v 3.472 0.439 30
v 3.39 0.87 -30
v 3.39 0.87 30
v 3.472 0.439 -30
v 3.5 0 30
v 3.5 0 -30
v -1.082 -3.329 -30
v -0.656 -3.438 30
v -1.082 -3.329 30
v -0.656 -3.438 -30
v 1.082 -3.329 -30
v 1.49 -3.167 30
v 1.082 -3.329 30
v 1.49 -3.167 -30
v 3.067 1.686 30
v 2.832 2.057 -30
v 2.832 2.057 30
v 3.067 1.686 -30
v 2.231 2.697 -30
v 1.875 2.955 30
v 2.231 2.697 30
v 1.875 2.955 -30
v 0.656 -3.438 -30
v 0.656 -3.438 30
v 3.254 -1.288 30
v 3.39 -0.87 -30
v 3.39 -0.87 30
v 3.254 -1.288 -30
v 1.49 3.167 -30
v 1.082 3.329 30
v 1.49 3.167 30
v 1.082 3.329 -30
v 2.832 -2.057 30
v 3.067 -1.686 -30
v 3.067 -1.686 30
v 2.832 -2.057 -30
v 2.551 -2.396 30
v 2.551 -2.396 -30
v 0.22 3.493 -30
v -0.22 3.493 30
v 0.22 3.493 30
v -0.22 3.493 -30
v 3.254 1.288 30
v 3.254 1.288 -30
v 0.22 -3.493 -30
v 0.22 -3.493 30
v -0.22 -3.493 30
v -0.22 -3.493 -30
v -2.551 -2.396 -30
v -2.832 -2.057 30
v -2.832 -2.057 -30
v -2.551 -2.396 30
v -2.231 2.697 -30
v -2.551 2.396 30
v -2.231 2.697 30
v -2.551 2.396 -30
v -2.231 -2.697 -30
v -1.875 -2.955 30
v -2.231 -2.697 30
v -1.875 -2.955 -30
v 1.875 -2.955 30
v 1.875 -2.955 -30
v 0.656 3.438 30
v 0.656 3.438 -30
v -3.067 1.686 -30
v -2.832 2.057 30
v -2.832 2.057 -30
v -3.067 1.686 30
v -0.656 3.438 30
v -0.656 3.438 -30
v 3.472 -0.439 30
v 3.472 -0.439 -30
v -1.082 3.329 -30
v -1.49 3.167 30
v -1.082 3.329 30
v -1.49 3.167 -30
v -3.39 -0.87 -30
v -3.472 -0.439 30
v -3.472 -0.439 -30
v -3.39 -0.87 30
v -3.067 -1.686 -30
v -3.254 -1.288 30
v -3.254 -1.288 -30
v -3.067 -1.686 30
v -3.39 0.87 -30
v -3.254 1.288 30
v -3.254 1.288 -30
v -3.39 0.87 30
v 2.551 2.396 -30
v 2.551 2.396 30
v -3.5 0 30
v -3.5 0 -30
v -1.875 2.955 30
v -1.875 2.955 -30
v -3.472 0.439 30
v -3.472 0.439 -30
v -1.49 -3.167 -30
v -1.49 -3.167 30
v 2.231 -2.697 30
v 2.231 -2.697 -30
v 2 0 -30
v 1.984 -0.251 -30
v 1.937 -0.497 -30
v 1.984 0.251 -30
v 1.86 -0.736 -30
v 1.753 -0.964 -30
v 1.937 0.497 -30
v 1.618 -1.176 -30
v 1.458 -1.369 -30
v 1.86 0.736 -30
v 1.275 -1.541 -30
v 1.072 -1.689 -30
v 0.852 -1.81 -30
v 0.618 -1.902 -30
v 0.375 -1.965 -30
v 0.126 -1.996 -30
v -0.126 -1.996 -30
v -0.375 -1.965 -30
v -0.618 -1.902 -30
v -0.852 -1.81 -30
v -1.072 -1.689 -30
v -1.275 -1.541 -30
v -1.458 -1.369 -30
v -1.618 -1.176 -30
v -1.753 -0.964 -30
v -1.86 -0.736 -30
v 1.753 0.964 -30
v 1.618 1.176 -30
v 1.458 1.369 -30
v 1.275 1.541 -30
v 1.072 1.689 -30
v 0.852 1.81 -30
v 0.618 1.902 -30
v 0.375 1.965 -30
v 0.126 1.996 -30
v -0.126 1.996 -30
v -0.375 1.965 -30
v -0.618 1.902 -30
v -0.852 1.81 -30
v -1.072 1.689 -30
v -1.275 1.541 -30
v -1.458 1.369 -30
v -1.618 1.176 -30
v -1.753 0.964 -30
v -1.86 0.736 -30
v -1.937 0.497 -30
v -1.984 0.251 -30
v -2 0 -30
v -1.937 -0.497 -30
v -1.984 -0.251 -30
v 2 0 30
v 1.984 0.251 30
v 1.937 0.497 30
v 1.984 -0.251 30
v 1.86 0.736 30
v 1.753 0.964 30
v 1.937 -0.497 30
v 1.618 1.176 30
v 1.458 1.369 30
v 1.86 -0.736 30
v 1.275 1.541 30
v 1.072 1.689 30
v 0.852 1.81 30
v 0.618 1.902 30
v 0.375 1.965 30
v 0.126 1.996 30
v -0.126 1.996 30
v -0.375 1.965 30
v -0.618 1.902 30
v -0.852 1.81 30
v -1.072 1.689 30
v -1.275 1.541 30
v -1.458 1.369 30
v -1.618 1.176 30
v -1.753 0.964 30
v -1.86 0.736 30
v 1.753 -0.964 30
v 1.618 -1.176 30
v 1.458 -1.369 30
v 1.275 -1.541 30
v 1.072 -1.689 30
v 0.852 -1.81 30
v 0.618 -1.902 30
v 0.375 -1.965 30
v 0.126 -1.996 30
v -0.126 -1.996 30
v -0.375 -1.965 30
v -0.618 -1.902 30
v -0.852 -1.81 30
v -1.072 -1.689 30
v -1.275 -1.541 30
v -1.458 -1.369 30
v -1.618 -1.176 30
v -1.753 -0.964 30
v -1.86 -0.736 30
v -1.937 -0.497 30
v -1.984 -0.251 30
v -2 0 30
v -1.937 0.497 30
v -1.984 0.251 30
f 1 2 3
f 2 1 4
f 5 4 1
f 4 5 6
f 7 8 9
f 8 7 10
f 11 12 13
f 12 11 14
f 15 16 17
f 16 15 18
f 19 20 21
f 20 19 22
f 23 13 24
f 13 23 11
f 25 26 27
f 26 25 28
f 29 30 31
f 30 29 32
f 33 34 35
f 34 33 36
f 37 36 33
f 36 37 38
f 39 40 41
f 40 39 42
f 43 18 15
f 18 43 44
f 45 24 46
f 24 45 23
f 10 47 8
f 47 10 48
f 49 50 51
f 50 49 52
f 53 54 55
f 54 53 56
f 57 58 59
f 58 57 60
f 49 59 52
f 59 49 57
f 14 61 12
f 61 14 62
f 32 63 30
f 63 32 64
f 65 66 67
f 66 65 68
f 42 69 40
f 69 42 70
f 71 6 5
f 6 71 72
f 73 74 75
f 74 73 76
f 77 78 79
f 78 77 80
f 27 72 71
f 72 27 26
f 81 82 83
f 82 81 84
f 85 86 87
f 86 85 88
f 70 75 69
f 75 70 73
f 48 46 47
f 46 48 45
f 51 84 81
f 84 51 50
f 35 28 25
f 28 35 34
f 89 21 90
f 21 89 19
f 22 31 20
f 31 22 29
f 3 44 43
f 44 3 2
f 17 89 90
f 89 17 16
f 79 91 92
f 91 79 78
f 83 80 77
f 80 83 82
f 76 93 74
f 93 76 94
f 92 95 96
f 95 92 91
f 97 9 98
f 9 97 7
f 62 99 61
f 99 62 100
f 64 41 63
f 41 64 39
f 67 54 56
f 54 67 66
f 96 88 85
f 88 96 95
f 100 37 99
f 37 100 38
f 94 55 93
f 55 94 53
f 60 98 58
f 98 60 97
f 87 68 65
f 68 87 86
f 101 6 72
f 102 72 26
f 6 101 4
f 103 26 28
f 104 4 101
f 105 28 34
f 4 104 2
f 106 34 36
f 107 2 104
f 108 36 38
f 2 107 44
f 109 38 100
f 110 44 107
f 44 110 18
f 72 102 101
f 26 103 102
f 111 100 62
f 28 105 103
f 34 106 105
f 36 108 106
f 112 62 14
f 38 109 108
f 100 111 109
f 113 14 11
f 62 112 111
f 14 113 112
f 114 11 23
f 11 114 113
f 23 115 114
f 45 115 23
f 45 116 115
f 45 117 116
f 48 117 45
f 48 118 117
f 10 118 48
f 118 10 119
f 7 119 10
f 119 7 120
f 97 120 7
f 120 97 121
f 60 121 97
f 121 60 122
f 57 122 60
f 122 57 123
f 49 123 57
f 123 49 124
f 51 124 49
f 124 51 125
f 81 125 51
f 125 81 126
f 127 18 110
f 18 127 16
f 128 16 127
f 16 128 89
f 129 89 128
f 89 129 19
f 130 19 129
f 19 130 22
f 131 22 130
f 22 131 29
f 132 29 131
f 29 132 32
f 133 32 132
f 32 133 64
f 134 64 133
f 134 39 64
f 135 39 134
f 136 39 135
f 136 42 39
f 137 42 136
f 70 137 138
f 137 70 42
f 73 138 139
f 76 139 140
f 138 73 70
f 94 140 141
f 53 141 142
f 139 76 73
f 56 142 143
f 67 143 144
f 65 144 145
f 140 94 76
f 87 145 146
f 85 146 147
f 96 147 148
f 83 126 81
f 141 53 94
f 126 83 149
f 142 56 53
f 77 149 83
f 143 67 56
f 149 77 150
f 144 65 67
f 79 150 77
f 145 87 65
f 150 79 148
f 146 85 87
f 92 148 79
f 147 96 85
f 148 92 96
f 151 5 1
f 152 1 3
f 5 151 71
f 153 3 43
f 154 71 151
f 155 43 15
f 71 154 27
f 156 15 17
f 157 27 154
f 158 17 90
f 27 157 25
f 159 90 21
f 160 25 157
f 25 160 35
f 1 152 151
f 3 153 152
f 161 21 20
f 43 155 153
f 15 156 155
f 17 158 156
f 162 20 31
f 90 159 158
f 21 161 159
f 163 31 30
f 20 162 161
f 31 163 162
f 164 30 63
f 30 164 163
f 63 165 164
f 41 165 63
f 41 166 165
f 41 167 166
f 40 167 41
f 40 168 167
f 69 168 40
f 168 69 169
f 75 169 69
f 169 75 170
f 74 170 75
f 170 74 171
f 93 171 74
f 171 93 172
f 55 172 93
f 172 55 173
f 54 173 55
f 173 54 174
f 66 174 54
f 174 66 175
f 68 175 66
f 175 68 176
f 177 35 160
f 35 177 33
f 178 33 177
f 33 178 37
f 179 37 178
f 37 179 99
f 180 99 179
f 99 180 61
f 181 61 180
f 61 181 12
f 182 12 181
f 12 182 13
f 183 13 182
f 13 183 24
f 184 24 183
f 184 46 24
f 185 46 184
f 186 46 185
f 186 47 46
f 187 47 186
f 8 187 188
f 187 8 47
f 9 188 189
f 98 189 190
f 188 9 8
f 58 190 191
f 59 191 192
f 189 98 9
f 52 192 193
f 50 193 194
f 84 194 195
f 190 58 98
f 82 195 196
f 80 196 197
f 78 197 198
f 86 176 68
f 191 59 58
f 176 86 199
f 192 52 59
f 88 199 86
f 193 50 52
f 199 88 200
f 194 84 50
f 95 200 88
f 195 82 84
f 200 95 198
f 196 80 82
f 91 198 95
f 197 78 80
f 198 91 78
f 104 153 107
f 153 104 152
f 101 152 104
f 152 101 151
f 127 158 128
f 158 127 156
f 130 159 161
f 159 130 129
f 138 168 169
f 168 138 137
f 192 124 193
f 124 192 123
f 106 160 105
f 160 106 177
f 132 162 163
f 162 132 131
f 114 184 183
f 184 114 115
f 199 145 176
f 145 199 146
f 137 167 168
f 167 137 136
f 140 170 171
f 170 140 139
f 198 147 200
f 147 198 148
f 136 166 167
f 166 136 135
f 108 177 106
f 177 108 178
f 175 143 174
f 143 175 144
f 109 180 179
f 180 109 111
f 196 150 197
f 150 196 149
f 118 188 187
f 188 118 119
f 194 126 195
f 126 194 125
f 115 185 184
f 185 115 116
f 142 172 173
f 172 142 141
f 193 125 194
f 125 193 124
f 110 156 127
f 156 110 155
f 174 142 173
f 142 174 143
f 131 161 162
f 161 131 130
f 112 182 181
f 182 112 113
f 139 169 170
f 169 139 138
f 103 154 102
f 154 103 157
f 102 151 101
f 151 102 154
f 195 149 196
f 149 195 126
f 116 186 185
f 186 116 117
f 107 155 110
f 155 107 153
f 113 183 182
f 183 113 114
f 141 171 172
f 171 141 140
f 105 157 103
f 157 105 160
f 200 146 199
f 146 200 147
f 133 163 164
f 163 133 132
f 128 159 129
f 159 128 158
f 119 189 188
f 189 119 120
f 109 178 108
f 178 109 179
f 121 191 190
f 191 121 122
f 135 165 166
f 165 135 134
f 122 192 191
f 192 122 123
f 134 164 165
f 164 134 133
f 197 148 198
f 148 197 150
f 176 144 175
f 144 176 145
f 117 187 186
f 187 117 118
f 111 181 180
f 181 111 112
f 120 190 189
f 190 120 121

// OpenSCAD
$fn = 50;


difference() {
	union() {
		translate(v = [0, 0, -30.0000000000]) {
			cylinder(h = 60, r = 3.5000000000);
		}
	}
	union() {
		translate(v = [0, 0, -100.0000000000]) {
			cylinder(h = 200, r = 2.0000000000);
		}
	}
}
